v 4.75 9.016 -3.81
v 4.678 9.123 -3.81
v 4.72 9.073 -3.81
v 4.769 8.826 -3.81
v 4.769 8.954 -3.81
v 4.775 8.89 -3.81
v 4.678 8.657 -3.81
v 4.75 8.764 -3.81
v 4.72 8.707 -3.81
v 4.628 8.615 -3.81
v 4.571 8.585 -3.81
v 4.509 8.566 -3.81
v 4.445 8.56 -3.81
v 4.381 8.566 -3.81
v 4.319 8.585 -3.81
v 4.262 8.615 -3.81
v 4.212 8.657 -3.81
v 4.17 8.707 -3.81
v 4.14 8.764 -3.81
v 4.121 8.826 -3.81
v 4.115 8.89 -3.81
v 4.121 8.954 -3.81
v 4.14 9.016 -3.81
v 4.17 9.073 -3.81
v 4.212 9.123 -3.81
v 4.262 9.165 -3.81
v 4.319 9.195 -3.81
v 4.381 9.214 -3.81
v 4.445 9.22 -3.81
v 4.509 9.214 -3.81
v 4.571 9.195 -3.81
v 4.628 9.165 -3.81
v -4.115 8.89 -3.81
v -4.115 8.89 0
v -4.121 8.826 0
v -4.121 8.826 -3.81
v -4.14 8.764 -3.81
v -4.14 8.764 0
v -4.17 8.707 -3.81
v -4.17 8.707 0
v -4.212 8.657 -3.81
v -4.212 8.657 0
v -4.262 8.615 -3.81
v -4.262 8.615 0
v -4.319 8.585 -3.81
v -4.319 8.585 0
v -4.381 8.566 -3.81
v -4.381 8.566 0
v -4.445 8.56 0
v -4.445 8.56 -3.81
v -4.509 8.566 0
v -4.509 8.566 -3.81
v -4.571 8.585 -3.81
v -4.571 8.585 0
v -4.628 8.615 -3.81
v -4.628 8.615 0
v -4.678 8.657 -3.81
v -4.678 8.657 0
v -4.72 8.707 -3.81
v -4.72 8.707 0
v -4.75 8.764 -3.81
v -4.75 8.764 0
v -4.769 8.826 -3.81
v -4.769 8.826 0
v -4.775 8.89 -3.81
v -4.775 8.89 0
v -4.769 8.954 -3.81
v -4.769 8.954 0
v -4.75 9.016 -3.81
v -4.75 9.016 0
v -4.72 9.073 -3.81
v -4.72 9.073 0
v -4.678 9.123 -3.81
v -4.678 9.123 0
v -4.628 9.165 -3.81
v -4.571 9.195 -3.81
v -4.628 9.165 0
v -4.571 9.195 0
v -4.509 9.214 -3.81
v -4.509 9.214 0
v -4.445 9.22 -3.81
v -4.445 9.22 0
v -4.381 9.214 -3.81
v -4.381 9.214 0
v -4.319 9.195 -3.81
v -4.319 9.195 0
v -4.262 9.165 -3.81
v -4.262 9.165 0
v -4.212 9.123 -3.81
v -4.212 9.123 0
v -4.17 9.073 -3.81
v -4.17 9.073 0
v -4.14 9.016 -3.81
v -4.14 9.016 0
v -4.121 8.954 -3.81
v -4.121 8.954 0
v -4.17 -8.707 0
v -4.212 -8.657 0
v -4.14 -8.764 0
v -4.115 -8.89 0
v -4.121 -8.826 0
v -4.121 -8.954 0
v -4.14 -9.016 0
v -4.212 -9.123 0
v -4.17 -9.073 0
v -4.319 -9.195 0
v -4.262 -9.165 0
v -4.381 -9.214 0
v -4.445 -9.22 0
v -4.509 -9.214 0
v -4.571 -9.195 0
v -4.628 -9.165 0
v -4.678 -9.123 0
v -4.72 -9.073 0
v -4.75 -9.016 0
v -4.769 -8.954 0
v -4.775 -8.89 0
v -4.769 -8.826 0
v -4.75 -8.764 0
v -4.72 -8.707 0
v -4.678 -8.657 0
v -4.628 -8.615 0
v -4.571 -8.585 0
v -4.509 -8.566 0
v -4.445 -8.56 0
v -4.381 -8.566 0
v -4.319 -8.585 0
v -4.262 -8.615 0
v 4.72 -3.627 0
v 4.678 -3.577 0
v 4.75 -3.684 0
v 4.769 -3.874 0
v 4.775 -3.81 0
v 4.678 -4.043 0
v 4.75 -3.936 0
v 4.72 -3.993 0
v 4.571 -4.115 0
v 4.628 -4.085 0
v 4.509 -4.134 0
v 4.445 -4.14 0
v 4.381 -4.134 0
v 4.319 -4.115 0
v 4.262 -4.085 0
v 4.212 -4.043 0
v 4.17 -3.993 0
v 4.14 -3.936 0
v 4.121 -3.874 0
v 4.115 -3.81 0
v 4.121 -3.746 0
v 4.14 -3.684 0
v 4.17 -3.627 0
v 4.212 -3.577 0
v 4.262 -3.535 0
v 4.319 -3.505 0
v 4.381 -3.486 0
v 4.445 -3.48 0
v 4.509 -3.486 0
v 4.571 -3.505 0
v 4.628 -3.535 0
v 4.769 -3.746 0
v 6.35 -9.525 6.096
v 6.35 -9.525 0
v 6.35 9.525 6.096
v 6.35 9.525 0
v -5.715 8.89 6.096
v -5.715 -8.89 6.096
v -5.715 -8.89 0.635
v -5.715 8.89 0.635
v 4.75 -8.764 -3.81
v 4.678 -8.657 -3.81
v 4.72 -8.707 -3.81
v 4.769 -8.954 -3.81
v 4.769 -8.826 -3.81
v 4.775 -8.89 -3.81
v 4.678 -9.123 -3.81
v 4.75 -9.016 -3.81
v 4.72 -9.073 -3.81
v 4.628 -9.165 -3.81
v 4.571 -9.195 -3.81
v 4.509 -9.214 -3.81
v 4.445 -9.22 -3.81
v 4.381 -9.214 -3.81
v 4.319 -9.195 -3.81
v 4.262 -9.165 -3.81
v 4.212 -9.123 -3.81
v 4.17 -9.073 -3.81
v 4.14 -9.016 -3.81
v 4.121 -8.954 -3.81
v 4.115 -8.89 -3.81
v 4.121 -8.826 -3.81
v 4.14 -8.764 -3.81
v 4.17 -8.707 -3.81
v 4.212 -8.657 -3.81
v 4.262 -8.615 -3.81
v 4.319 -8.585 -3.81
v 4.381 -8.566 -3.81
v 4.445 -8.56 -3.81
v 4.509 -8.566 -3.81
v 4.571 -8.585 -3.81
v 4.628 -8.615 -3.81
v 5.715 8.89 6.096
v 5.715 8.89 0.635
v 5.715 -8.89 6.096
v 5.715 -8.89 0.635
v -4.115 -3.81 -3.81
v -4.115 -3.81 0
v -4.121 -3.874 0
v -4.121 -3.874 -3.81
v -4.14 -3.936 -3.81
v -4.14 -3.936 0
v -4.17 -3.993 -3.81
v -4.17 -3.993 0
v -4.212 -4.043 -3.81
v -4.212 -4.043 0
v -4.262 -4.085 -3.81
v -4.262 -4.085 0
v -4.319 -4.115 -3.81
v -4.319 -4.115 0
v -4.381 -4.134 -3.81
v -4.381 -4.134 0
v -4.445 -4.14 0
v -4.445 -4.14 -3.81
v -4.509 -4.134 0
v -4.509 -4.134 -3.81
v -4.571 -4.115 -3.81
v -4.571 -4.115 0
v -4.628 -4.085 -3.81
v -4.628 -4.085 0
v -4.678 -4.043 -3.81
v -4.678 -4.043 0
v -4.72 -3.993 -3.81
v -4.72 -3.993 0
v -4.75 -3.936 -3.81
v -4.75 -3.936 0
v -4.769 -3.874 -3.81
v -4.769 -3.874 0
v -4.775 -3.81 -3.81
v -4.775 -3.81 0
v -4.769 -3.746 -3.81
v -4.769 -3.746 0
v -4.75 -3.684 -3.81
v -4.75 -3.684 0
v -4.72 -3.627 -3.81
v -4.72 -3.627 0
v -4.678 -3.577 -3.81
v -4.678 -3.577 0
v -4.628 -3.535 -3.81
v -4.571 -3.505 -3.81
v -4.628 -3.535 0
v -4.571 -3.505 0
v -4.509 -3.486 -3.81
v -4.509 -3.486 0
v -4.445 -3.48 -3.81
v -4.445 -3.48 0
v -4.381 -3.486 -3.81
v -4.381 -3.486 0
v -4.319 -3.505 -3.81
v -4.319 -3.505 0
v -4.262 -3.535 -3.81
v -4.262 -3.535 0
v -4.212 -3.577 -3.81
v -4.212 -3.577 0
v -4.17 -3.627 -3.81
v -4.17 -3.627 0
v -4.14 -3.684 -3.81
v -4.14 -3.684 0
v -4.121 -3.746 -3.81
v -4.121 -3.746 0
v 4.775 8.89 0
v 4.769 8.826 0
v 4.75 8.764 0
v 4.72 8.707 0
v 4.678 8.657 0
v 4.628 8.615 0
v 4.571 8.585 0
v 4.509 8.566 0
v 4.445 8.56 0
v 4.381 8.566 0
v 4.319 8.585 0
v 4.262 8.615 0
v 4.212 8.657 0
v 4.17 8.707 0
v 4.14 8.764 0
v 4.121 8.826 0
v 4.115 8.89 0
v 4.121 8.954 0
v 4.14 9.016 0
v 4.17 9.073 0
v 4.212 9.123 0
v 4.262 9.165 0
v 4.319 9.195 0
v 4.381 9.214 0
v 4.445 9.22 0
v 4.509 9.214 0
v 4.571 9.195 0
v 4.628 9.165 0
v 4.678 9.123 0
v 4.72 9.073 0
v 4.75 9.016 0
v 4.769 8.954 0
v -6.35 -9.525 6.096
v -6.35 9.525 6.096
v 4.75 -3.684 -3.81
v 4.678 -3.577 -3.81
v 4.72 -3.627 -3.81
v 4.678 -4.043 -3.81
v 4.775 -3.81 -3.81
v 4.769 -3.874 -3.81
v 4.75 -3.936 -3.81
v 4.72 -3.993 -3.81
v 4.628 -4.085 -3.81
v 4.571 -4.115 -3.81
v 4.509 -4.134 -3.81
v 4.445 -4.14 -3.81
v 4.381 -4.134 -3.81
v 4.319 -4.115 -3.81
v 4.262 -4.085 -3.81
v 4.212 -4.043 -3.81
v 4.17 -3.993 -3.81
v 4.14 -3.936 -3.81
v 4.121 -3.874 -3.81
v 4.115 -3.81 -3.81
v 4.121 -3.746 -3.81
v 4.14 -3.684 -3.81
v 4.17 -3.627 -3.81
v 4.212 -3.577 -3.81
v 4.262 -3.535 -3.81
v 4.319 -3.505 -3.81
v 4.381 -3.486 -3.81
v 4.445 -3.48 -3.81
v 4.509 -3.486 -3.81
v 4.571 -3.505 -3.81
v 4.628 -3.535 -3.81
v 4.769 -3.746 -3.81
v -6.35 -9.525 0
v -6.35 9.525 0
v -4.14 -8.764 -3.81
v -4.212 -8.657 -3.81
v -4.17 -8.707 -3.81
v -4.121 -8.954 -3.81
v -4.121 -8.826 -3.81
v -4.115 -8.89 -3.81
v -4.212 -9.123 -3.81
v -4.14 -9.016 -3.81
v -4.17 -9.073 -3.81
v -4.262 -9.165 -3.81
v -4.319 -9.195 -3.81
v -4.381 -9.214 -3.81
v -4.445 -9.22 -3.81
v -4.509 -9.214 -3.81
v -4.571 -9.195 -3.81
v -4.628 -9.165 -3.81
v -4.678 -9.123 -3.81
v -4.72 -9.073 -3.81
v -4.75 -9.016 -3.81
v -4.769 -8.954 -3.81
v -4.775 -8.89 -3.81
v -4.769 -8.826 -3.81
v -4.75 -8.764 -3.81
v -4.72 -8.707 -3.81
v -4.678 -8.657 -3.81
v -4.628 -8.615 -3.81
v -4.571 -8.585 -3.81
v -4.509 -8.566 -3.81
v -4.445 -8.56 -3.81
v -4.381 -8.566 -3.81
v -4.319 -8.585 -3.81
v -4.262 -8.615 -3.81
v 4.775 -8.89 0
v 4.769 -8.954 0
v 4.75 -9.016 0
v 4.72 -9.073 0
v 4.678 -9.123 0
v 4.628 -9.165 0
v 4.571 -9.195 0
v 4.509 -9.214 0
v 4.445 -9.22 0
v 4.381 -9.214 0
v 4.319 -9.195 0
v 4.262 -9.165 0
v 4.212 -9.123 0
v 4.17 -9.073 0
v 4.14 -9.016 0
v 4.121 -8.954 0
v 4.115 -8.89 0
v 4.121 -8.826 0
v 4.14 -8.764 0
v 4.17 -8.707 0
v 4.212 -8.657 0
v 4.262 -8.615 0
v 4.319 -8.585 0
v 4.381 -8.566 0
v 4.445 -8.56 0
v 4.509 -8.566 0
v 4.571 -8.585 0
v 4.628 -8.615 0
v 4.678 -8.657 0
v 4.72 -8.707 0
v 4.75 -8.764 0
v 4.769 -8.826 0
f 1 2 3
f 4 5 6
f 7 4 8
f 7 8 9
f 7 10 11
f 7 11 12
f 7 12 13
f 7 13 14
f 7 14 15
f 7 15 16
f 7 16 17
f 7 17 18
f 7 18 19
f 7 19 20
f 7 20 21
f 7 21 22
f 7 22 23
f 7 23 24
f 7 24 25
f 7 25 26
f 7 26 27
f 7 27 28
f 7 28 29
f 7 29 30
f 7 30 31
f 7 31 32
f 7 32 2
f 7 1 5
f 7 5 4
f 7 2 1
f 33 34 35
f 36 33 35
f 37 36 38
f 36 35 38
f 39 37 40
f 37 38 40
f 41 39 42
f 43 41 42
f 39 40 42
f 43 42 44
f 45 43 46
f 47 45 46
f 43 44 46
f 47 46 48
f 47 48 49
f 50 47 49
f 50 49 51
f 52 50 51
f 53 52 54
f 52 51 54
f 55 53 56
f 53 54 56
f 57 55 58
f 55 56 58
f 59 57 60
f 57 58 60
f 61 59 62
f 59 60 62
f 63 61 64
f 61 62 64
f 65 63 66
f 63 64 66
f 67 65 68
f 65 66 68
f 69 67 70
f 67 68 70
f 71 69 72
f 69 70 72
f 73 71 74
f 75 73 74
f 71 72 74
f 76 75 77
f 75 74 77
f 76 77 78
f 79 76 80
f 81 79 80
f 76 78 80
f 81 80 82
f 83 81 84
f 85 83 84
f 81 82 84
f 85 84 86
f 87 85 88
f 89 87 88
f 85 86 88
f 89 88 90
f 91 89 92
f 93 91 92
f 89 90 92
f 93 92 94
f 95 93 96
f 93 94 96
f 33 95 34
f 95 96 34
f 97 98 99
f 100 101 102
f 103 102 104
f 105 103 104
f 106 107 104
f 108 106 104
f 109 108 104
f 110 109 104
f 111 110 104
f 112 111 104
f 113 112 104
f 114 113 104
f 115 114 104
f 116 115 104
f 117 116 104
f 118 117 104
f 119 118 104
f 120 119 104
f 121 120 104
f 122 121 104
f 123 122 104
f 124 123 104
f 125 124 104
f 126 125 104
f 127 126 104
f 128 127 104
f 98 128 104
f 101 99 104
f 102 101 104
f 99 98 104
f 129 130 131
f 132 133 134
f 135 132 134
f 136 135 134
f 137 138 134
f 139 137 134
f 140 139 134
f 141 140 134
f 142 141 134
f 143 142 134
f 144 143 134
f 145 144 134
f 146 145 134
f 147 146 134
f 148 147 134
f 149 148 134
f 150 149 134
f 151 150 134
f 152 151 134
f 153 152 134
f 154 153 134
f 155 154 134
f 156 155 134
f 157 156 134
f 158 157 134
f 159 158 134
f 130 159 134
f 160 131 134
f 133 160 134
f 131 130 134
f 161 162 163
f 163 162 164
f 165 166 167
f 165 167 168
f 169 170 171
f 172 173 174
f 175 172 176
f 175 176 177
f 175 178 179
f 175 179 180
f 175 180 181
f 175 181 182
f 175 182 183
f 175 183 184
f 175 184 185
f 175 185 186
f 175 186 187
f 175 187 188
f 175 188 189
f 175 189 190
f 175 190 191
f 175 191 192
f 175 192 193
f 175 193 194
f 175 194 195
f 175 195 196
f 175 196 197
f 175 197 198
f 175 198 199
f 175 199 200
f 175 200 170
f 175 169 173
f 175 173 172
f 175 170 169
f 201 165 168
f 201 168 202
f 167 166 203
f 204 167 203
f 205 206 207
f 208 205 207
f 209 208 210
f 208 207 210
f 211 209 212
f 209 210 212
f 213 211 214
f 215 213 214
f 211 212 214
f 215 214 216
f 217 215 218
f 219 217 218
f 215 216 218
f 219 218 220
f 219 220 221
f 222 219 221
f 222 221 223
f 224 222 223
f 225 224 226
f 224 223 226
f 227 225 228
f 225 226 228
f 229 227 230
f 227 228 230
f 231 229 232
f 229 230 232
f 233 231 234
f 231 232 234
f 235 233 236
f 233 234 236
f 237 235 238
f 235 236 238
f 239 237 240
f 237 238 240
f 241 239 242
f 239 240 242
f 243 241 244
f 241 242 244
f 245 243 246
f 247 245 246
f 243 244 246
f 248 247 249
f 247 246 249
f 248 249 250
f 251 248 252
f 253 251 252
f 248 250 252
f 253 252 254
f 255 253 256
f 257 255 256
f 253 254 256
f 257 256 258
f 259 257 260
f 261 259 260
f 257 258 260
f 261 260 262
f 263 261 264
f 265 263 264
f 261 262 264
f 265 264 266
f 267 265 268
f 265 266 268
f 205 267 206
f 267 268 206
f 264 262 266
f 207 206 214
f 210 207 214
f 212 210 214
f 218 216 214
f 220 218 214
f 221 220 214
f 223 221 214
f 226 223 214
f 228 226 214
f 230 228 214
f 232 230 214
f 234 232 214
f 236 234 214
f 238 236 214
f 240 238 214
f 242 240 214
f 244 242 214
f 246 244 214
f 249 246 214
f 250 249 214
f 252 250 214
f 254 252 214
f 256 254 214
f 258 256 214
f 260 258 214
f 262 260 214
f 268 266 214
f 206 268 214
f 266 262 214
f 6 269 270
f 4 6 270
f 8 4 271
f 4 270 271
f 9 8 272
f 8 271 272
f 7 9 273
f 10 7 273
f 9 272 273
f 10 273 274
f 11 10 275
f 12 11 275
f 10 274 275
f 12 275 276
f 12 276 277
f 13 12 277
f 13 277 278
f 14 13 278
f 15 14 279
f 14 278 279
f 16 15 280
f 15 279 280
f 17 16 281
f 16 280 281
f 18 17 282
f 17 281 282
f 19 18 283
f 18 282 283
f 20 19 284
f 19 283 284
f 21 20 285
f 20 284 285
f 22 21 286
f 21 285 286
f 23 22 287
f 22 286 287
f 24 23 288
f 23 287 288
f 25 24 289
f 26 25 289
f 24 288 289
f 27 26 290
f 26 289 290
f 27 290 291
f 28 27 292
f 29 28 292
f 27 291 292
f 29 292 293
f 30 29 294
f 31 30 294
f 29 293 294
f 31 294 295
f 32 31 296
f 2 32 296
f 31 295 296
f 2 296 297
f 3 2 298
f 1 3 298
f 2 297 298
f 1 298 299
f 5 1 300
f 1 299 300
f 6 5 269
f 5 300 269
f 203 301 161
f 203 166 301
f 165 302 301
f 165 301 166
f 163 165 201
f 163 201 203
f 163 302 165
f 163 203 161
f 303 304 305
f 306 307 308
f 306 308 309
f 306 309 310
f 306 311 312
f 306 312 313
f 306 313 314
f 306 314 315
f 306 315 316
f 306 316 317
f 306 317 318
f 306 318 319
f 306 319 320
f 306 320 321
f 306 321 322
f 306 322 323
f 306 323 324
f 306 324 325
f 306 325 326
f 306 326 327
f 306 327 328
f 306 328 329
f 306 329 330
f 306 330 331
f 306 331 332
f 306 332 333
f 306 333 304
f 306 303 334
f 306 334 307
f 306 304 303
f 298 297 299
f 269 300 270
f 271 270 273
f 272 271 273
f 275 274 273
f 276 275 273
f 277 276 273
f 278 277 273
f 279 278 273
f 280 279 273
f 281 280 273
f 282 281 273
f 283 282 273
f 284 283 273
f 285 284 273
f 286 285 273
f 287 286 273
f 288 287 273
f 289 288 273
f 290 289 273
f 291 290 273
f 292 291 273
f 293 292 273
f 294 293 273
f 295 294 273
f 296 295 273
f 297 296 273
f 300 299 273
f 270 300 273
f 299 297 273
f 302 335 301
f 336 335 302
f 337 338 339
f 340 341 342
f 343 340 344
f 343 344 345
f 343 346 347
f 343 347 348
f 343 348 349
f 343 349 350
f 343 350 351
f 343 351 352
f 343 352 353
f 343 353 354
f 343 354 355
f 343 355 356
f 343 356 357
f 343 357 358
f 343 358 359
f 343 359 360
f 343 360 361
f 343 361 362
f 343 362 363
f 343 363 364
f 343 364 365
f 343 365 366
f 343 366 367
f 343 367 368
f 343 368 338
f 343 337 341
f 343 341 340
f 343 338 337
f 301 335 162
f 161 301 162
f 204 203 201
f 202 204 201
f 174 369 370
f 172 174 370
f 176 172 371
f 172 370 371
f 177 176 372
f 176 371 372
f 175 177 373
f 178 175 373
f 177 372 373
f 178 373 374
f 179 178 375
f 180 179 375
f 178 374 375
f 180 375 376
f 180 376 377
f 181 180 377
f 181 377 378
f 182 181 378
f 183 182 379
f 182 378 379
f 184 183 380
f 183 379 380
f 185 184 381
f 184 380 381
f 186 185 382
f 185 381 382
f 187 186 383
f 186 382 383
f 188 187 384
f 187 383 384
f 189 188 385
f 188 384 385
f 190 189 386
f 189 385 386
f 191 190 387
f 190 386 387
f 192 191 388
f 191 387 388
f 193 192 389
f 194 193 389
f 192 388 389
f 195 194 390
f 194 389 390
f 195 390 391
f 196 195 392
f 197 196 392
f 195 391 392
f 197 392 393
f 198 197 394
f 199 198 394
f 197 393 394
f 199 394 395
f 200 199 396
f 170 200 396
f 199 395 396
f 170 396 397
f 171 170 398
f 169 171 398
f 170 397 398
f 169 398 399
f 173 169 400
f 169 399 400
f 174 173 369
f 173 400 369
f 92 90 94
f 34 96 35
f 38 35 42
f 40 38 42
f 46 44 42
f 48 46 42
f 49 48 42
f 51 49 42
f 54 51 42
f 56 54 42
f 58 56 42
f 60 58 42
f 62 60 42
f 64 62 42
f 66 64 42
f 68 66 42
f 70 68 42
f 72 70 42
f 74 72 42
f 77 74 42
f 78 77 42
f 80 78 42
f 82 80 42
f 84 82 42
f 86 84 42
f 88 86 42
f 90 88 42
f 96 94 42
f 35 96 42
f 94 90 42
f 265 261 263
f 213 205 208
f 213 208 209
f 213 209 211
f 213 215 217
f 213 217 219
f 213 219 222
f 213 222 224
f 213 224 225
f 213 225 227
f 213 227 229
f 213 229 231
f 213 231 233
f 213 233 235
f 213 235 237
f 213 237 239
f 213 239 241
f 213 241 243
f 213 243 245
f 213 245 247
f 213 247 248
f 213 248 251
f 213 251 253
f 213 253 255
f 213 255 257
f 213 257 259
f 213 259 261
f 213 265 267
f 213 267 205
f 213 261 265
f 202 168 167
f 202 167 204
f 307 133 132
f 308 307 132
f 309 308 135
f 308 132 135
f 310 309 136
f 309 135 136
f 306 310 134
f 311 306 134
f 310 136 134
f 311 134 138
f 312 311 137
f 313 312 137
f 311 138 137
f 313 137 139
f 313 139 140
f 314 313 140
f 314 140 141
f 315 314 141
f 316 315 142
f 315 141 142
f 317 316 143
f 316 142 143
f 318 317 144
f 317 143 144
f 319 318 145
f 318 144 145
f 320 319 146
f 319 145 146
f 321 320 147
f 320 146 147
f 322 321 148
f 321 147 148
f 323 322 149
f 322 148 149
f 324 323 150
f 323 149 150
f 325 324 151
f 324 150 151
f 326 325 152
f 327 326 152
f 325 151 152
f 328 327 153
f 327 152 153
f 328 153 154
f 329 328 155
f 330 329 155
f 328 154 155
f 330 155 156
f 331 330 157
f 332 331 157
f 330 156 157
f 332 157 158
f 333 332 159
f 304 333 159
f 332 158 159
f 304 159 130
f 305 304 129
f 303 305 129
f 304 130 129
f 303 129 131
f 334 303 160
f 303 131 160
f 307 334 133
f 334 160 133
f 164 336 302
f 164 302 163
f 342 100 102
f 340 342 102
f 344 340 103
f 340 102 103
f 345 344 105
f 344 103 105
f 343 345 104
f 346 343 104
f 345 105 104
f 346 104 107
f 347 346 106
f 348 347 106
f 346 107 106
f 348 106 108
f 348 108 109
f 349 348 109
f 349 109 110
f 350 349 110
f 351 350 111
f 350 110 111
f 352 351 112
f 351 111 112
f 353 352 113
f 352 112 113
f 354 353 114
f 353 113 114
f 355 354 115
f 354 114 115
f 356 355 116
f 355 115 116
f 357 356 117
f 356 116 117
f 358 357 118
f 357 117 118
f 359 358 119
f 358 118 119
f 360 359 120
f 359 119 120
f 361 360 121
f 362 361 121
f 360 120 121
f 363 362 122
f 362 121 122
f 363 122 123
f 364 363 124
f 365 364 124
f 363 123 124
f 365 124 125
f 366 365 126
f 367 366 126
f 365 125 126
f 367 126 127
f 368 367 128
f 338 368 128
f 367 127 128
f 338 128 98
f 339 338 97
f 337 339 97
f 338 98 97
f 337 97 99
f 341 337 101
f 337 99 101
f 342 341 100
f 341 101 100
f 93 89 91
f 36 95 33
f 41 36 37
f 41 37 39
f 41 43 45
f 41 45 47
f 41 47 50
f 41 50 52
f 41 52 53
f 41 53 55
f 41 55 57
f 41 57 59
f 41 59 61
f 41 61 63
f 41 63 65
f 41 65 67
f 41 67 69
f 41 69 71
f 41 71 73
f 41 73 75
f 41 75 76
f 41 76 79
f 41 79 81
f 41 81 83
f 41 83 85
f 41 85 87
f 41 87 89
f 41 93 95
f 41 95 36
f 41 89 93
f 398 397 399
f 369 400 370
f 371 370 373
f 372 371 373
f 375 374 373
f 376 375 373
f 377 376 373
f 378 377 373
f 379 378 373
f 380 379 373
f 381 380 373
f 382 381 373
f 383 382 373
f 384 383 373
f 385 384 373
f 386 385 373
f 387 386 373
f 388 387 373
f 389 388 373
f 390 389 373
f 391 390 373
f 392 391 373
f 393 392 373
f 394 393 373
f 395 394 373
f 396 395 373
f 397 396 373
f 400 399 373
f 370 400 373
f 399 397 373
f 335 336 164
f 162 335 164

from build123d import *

# Parameters (mm, degrees)
F1_W     = 12.7
F1_H     = 19.05
F2_DEPTH = 6.096
F3_W     = 11.43
F3_H     = 17.78
F4_DEPTH = 5.461
F5_R     = 0.3302
F6_DEPTH = 3.81


with BuildPart() as f2:
    # F1 (on Top) → F2 (new body)
    with BuildSketch(Plane.XY):
        Rectangle(F1_W, F1_H)
    extrude(amount=F2_DEPTH)

    # F3 (on face) → F4 (cut)
    with BuildSketch(Plane.XY.offset(6.096)):
        Rectangle(F3_W, F3_H)
    extrude(amount=-F4_DEPTH, mode=Mode.SUBTRACT)


with BuildPart() as f6:
    # F5 (on face) → F6 (new body)
    with BuildSketch(Plane(origin=(0, 0, 0), x_dir=(1, 0, 0), z_dir=(0, 0, -1))):
        with Locations((4.445, -8.89)):
            Circle(F5_R)
    extrude(amount=F6_DEPTH)


with BuildPart() as f6b:
    # F5 (on face) → F6, piece 2 (new body)
    with BuildSketch(Plane(origin=(0, 0, 0), x_dir=(1, 0, 0), z_dir=(0, 0, -1))):
        with Locations((4.445, 3.81)):
            Circle(F5_R)
    extrude(amount=F6_DEPTH)


with BuildPart() as f6c:
    # F5 (on face) → F6, piece 3 (new body)
    with BuildSketch(Plane(origin=(0, 0, 0), x_dir=(1, 0, 0), z_dir=(0, 0, -1))):
        with Locations((4.445, 8.89)):
            Circle(F5_R)
    extrude(amount=F6_DEPTH)


with BuildPart() as f6d:
    # F5 (on face) → F6, piece 4 (new body)
    with BuildSketch(Plane(origin=(0, 0, 0), x_dir=(1, 0, 0), z_dir=(0, 0, -1))):
        with Locations((-4.445, 8.89)):
            Circle(F5_R)
    extrude(amount=F6_DEPTH)


with BuildPart() as f6e:
    # F5 (on face) → F6, piece 5 (new body)
    with BuildSketch(Plane(origin=(0, 0, 0), x_dir=(1, 0, 0), z_dir=(0, 0, -1))):
        with Locations((-4.445, 3.81)):
            Circle(F5_R)
    extrude(amount=F6_DEPTH)


with BuildPart() as f6f:
    # F5 (on face) → F6, piece 6 (new body)
    with BuildSketch(Plane(origin=(0, 0, 0), x_dir=(1, 0, 0), z_dir=(0, 0, -1))):
        with Locations((-4.445, -8.89)):
            Circle(F5_R)
    extrude(amount=F6_DEPTH)


solid = Compound([f2.part, f6.part, f6b.part, f6c.part, f6d.part, f6e.part, f6f.part])
